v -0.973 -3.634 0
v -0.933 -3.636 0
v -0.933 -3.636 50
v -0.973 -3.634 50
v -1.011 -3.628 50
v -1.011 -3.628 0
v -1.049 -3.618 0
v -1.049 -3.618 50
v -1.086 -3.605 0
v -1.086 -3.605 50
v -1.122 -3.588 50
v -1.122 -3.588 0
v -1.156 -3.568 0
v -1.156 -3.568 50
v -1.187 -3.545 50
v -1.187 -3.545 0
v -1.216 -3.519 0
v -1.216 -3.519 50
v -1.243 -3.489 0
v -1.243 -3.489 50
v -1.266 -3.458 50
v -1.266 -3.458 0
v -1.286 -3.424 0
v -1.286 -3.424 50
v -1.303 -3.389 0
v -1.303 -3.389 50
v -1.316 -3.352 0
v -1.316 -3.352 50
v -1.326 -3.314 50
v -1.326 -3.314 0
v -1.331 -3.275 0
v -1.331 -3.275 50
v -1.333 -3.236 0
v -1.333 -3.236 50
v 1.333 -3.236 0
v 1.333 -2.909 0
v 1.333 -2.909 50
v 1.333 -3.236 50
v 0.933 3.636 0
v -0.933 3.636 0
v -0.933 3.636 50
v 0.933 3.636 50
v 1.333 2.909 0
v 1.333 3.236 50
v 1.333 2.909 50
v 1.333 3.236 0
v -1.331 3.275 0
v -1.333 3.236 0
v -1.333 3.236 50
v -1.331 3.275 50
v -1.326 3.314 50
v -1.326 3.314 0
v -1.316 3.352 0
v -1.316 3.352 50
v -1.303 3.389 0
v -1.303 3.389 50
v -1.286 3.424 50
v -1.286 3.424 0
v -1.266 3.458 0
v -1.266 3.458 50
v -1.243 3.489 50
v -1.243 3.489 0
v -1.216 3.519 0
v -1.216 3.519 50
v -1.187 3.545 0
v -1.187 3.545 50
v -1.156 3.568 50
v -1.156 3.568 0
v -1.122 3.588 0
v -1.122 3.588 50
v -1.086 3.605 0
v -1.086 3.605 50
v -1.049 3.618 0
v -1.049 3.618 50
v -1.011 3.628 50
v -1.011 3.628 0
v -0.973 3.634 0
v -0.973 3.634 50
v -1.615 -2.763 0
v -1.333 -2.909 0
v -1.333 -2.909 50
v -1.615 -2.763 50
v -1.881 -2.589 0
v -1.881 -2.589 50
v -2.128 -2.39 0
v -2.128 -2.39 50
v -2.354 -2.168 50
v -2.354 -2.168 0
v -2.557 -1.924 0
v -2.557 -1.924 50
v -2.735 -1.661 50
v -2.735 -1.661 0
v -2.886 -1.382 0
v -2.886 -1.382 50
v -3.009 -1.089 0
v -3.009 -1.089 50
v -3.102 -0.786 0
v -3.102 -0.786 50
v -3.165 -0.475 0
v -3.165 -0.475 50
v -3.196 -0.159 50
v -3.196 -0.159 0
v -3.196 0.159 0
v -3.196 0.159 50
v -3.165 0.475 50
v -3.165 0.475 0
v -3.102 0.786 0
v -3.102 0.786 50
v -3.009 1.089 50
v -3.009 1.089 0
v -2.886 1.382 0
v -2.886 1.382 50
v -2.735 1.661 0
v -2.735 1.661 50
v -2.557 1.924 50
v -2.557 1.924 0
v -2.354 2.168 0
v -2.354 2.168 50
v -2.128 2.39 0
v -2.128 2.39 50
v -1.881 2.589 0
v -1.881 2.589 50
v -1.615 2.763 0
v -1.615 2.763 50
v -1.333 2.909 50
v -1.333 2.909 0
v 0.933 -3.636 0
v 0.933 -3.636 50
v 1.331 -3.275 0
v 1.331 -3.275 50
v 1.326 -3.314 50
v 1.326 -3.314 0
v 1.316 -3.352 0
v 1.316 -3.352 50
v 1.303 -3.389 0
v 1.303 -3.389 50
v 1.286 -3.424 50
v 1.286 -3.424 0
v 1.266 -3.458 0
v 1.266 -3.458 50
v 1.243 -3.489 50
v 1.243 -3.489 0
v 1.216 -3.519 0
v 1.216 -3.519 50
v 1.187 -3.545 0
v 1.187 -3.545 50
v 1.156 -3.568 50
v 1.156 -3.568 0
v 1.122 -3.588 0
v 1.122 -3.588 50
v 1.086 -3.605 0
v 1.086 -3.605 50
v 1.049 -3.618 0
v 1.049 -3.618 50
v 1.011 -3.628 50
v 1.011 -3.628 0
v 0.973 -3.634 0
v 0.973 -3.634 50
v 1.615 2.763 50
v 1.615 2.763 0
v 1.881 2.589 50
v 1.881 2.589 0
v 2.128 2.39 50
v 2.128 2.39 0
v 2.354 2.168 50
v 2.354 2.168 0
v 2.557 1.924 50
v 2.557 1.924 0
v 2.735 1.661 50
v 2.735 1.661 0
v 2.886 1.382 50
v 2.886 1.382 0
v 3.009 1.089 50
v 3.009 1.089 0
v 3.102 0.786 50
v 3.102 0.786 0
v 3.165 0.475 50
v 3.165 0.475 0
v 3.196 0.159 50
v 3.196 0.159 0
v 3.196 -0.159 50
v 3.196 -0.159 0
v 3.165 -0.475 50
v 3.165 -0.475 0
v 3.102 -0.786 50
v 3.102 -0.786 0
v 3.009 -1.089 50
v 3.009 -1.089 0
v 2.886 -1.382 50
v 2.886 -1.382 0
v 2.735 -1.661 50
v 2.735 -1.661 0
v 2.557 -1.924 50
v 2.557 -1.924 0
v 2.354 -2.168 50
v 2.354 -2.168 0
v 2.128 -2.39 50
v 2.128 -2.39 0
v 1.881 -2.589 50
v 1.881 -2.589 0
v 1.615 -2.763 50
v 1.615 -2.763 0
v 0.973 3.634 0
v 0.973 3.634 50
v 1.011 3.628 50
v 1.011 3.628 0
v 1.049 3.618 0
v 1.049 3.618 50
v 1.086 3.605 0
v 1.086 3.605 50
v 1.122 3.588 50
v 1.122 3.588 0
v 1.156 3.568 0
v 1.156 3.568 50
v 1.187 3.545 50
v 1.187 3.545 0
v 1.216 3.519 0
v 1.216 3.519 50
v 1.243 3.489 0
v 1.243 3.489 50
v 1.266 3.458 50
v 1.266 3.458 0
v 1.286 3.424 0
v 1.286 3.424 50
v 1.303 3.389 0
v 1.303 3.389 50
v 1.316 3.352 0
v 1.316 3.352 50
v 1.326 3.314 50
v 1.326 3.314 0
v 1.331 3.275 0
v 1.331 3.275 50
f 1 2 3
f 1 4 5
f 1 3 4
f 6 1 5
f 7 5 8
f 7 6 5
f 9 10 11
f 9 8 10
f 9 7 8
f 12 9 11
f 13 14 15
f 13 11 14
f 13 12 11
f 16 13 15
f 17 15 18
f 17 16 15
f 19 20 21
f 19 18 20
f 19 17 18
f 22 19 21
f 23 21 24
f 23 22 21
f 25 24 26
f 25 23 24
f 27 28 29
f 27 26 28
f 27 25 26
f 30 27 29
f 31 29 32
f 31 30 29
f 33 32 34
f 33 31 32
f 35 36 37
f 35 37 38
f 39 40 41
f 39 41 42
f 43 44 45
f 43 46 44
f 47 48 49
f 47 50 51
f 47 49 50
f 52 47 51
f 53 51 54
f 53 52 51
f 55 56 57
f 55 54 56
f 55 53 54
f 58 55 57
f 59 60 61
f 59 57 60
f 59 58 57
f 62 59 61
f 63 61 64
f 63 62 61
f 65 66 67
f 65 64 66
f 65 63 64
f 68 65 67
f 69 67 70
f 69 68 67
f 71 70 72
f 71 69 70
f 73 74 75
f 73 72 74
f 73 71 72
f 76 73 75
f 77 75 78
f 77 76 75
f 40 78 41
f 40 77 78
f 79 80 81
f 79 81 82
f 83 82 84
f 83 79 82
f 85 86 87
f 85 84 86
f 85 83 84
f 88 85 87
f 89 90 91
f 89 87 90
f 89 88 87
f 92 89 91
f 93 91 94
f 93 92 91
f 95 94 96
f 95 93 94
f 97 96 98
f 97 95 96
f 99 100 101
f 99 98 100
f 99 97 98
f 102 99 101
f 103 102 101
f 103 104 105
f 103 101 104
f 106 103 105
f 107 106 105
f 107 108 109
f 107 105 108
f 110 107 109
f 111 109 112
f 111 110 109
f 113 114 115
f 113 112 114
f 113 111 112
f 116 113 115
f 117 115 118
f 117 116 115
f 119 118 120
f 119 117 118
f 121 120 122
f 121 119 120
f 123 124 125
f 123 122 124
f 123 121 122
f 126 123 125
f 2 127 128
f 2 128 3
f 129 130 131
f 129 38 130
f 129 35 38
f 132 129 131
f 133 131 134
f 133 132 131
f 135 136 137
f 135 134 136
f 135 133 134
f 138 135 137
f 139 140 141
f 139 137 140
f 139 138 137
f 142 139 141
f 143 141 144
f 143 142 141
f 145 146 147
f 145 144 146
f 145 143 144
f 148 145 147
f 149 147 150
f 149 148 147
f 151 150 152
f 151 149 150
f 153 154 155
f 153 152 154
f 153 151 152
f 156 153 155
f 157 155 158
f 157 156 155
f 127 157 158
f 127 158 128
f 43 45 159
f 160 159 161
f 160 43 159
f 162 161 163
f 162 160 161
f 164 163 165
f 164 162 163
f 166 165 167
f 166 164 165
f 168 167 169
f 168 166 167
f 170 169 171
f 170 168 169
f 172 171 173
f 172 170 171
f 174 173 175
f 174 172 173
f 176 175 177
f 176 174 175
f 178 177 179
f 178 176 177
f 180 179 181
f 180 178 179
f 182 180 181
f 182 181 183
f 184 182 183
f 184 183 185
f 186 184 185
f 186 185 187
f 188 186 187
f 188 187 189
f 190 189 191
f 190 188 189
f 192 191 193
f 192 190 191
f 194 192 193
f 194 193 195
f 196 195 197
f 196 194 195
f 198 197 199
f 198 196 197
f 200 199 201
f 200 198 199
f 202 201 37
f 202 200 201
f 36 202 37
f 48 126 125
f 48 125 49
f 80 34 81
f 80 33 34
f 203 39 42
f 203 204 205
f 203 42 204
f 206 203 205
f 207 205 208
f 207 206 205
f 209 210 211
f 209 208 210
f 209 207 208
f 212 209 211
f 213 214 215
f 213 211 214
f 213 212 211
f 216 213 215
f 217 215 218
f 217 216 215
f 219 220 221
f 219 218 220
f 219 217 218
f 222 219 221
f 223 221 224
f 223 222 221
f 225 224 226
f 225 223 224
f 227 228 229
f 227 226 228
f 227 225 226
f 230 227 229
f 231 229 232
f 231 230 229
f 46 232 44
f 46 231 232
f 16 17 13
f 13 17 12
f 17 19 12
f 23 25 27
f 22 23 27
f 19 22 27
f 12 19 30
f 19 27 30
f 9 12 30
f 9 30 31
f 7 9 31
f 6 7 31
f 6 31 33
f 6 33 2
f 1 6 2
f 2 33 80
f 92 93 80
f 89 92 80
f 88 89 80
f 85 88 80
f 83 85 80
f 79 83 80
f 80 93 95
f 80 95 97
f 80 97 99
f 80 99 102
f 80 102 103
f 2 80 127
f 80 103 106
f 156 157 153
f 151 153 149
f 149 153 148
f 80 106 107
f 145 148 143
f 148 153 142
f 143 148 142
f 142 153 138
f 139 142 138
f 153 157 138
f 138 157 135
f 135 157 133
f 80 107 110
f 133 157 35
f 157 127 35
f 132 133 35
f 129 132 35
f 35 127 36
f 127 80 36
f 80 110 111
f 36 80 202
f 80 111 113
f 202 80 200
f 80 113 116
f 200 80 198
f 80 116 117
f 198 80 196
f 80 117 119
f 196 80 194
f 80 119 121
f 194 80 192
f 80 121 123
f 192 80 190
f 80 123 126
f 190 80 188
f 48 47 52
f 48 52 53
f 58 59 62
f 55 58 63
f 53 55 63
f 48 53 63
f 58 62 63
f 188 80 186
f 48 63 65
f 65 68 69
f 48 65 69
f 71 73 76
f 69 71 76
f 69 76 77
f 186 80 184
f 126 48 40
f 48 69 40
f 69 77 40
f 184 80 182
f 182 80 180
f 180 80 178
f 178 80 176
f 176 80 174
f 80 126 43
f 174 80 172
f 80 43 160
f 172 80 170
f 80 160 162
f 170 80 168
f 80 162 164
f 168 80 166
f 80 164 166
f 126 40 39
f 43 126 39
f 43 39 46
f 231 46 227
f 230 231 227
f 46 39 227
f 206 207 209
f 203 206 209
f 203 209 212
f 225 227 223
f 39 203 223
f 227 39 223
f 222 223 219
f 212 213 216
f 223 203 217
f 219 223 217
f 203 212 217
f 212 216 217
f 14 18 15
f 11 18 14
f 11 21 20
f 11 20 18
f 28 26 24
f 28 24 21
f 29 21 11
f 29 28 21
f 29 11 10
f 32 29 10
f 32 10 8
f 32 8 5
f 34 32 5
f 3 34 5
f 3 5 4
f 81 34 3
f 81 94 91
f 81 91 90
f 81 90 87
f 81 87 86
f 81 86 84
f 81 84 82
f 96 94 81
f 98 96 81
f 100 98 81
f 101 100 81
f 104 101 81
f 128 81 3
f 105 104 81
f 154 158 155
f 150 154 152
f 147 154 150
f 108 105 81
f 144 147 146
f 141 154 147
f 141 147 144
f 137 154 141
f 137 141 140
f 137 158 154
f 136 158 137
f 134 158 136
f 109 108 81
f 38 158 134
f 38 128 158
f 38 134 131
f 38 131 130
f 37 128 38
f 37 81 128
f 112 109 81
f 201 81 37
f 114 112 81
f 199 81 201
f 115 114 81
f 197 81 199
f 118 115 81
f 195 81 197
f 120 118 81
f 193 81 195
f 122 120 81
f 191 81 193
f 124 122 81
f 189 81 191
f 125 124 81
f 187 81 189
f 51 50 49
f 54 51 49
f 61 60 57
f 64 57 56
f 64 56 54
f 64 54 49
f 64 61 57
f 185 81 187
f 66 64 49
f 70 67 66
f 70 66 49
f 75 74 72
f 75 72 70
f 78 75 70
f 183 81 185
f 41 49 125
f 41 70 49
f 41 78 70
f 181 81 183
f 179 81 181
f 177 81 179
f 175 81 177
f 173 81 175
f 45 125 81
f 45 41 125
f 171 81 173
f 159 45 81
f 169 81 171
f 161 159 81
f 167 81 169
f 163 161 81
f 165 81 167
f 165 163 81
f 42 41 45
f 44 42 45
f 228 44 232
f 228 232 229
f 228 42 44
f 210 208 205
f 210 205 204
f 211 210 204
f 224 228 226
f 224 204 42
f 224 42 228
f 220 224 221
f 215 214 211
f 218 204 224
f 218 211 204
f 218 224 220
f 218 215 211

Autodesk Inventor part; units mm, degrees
ref_plane "YZ Plane" through (0, 0, 0) normal (1, 0, 0) x (0, 1, 0)
ref_plane "XZ Plane" through (0, 0, 0) normal (0, 1, 0) x (-1, 0, 0)
ref_plane "XY Plane" through (0, 0, 0) normal (0, 0, 1) x (1, 0, 0)
sketch "Sketch1" plane through (0, 0, 0) normal (0, 0, 1) x (1, 0, 0)
  circle A0 centre (0, 0) radius 3.2
  line L0 (0.9333, -3.6357) -> (-0.9333, -3.6357)
  line L1 (-1.3333, -3.2357) -> (-1.3333, 3.2357)
  line L2 (-0.9333, 3.6357) -> (0.9333, 3.6357)
  line L3 (1.3333, 3.2357) -> (1.3333, -3.2357)
  line L4 (1.3333, -3.6357) -> (-1.3333, 3.6357) construction
  line L5 (-1.3333, -3.6357) -> (1.3333, 3.6357) construction
  arc A1 (-0.9333, 3.6357) -> (-1.3333, 3.2357) centre (-0.9333, 3.2357) ccw
  arc A2 (1.3333, 3.2357) -> (0.9333, 3.6357) centre (0.9333, 3.2357) ccw
  arc A3 (0.9333, -3.6357) -> (1.3333, -3.2357) centre (0.9333, -3.2357) ccw
  arc A4 (-1.3333, -3.2357) -> (-0.9333, -3.6357) centre (-0.9333, -3.2357) ccw
  point P0 (-1.3333, 2.909)
  point P1 (-1.3333, -2.909)
  point P2 (1.3333, -2.909)
  point P3 (1.3333, 2.909)
  point P4 (-0.9416, 2.2076)
  point P5 (-0.9416, -2.2076)
  point P6 (0.9416, -2.2076)
  point P7 (0.9416, 2.2076)
  dimension "d0" = 6.4
  dimension "d1" = 2.6667
  dimension "d2" = 7.2714
  dimension "d3" = 0.4
extrude "Extrusion1" add sketch "Sketch1" along normal blind 50
equation "\"d0\" = D_axel - d_toleransAxel"
equation "\"d3\" = r_filletAxel"
equation "\"d4\" = h_axel"
equation "\"D_axel\" = D_axel_1_2_3"
equation "\"d_axelRing\" = d_axelRing_1_2_3"
equation "\"r_filletAxel\" = r_filletAxel_1_2_3"
equation "\"d_toleransAxel\" = 0.6"
equation "\"h_axel\" = 50"
equation "\"D_axel_1_2_3\" = 7"
equation "\"d_axelRing_1_2_3\" = 3"
equation "\"r_filletAxel_1_2_3\" = 0.4"
properties part number "Axel_parametriserad_03"
